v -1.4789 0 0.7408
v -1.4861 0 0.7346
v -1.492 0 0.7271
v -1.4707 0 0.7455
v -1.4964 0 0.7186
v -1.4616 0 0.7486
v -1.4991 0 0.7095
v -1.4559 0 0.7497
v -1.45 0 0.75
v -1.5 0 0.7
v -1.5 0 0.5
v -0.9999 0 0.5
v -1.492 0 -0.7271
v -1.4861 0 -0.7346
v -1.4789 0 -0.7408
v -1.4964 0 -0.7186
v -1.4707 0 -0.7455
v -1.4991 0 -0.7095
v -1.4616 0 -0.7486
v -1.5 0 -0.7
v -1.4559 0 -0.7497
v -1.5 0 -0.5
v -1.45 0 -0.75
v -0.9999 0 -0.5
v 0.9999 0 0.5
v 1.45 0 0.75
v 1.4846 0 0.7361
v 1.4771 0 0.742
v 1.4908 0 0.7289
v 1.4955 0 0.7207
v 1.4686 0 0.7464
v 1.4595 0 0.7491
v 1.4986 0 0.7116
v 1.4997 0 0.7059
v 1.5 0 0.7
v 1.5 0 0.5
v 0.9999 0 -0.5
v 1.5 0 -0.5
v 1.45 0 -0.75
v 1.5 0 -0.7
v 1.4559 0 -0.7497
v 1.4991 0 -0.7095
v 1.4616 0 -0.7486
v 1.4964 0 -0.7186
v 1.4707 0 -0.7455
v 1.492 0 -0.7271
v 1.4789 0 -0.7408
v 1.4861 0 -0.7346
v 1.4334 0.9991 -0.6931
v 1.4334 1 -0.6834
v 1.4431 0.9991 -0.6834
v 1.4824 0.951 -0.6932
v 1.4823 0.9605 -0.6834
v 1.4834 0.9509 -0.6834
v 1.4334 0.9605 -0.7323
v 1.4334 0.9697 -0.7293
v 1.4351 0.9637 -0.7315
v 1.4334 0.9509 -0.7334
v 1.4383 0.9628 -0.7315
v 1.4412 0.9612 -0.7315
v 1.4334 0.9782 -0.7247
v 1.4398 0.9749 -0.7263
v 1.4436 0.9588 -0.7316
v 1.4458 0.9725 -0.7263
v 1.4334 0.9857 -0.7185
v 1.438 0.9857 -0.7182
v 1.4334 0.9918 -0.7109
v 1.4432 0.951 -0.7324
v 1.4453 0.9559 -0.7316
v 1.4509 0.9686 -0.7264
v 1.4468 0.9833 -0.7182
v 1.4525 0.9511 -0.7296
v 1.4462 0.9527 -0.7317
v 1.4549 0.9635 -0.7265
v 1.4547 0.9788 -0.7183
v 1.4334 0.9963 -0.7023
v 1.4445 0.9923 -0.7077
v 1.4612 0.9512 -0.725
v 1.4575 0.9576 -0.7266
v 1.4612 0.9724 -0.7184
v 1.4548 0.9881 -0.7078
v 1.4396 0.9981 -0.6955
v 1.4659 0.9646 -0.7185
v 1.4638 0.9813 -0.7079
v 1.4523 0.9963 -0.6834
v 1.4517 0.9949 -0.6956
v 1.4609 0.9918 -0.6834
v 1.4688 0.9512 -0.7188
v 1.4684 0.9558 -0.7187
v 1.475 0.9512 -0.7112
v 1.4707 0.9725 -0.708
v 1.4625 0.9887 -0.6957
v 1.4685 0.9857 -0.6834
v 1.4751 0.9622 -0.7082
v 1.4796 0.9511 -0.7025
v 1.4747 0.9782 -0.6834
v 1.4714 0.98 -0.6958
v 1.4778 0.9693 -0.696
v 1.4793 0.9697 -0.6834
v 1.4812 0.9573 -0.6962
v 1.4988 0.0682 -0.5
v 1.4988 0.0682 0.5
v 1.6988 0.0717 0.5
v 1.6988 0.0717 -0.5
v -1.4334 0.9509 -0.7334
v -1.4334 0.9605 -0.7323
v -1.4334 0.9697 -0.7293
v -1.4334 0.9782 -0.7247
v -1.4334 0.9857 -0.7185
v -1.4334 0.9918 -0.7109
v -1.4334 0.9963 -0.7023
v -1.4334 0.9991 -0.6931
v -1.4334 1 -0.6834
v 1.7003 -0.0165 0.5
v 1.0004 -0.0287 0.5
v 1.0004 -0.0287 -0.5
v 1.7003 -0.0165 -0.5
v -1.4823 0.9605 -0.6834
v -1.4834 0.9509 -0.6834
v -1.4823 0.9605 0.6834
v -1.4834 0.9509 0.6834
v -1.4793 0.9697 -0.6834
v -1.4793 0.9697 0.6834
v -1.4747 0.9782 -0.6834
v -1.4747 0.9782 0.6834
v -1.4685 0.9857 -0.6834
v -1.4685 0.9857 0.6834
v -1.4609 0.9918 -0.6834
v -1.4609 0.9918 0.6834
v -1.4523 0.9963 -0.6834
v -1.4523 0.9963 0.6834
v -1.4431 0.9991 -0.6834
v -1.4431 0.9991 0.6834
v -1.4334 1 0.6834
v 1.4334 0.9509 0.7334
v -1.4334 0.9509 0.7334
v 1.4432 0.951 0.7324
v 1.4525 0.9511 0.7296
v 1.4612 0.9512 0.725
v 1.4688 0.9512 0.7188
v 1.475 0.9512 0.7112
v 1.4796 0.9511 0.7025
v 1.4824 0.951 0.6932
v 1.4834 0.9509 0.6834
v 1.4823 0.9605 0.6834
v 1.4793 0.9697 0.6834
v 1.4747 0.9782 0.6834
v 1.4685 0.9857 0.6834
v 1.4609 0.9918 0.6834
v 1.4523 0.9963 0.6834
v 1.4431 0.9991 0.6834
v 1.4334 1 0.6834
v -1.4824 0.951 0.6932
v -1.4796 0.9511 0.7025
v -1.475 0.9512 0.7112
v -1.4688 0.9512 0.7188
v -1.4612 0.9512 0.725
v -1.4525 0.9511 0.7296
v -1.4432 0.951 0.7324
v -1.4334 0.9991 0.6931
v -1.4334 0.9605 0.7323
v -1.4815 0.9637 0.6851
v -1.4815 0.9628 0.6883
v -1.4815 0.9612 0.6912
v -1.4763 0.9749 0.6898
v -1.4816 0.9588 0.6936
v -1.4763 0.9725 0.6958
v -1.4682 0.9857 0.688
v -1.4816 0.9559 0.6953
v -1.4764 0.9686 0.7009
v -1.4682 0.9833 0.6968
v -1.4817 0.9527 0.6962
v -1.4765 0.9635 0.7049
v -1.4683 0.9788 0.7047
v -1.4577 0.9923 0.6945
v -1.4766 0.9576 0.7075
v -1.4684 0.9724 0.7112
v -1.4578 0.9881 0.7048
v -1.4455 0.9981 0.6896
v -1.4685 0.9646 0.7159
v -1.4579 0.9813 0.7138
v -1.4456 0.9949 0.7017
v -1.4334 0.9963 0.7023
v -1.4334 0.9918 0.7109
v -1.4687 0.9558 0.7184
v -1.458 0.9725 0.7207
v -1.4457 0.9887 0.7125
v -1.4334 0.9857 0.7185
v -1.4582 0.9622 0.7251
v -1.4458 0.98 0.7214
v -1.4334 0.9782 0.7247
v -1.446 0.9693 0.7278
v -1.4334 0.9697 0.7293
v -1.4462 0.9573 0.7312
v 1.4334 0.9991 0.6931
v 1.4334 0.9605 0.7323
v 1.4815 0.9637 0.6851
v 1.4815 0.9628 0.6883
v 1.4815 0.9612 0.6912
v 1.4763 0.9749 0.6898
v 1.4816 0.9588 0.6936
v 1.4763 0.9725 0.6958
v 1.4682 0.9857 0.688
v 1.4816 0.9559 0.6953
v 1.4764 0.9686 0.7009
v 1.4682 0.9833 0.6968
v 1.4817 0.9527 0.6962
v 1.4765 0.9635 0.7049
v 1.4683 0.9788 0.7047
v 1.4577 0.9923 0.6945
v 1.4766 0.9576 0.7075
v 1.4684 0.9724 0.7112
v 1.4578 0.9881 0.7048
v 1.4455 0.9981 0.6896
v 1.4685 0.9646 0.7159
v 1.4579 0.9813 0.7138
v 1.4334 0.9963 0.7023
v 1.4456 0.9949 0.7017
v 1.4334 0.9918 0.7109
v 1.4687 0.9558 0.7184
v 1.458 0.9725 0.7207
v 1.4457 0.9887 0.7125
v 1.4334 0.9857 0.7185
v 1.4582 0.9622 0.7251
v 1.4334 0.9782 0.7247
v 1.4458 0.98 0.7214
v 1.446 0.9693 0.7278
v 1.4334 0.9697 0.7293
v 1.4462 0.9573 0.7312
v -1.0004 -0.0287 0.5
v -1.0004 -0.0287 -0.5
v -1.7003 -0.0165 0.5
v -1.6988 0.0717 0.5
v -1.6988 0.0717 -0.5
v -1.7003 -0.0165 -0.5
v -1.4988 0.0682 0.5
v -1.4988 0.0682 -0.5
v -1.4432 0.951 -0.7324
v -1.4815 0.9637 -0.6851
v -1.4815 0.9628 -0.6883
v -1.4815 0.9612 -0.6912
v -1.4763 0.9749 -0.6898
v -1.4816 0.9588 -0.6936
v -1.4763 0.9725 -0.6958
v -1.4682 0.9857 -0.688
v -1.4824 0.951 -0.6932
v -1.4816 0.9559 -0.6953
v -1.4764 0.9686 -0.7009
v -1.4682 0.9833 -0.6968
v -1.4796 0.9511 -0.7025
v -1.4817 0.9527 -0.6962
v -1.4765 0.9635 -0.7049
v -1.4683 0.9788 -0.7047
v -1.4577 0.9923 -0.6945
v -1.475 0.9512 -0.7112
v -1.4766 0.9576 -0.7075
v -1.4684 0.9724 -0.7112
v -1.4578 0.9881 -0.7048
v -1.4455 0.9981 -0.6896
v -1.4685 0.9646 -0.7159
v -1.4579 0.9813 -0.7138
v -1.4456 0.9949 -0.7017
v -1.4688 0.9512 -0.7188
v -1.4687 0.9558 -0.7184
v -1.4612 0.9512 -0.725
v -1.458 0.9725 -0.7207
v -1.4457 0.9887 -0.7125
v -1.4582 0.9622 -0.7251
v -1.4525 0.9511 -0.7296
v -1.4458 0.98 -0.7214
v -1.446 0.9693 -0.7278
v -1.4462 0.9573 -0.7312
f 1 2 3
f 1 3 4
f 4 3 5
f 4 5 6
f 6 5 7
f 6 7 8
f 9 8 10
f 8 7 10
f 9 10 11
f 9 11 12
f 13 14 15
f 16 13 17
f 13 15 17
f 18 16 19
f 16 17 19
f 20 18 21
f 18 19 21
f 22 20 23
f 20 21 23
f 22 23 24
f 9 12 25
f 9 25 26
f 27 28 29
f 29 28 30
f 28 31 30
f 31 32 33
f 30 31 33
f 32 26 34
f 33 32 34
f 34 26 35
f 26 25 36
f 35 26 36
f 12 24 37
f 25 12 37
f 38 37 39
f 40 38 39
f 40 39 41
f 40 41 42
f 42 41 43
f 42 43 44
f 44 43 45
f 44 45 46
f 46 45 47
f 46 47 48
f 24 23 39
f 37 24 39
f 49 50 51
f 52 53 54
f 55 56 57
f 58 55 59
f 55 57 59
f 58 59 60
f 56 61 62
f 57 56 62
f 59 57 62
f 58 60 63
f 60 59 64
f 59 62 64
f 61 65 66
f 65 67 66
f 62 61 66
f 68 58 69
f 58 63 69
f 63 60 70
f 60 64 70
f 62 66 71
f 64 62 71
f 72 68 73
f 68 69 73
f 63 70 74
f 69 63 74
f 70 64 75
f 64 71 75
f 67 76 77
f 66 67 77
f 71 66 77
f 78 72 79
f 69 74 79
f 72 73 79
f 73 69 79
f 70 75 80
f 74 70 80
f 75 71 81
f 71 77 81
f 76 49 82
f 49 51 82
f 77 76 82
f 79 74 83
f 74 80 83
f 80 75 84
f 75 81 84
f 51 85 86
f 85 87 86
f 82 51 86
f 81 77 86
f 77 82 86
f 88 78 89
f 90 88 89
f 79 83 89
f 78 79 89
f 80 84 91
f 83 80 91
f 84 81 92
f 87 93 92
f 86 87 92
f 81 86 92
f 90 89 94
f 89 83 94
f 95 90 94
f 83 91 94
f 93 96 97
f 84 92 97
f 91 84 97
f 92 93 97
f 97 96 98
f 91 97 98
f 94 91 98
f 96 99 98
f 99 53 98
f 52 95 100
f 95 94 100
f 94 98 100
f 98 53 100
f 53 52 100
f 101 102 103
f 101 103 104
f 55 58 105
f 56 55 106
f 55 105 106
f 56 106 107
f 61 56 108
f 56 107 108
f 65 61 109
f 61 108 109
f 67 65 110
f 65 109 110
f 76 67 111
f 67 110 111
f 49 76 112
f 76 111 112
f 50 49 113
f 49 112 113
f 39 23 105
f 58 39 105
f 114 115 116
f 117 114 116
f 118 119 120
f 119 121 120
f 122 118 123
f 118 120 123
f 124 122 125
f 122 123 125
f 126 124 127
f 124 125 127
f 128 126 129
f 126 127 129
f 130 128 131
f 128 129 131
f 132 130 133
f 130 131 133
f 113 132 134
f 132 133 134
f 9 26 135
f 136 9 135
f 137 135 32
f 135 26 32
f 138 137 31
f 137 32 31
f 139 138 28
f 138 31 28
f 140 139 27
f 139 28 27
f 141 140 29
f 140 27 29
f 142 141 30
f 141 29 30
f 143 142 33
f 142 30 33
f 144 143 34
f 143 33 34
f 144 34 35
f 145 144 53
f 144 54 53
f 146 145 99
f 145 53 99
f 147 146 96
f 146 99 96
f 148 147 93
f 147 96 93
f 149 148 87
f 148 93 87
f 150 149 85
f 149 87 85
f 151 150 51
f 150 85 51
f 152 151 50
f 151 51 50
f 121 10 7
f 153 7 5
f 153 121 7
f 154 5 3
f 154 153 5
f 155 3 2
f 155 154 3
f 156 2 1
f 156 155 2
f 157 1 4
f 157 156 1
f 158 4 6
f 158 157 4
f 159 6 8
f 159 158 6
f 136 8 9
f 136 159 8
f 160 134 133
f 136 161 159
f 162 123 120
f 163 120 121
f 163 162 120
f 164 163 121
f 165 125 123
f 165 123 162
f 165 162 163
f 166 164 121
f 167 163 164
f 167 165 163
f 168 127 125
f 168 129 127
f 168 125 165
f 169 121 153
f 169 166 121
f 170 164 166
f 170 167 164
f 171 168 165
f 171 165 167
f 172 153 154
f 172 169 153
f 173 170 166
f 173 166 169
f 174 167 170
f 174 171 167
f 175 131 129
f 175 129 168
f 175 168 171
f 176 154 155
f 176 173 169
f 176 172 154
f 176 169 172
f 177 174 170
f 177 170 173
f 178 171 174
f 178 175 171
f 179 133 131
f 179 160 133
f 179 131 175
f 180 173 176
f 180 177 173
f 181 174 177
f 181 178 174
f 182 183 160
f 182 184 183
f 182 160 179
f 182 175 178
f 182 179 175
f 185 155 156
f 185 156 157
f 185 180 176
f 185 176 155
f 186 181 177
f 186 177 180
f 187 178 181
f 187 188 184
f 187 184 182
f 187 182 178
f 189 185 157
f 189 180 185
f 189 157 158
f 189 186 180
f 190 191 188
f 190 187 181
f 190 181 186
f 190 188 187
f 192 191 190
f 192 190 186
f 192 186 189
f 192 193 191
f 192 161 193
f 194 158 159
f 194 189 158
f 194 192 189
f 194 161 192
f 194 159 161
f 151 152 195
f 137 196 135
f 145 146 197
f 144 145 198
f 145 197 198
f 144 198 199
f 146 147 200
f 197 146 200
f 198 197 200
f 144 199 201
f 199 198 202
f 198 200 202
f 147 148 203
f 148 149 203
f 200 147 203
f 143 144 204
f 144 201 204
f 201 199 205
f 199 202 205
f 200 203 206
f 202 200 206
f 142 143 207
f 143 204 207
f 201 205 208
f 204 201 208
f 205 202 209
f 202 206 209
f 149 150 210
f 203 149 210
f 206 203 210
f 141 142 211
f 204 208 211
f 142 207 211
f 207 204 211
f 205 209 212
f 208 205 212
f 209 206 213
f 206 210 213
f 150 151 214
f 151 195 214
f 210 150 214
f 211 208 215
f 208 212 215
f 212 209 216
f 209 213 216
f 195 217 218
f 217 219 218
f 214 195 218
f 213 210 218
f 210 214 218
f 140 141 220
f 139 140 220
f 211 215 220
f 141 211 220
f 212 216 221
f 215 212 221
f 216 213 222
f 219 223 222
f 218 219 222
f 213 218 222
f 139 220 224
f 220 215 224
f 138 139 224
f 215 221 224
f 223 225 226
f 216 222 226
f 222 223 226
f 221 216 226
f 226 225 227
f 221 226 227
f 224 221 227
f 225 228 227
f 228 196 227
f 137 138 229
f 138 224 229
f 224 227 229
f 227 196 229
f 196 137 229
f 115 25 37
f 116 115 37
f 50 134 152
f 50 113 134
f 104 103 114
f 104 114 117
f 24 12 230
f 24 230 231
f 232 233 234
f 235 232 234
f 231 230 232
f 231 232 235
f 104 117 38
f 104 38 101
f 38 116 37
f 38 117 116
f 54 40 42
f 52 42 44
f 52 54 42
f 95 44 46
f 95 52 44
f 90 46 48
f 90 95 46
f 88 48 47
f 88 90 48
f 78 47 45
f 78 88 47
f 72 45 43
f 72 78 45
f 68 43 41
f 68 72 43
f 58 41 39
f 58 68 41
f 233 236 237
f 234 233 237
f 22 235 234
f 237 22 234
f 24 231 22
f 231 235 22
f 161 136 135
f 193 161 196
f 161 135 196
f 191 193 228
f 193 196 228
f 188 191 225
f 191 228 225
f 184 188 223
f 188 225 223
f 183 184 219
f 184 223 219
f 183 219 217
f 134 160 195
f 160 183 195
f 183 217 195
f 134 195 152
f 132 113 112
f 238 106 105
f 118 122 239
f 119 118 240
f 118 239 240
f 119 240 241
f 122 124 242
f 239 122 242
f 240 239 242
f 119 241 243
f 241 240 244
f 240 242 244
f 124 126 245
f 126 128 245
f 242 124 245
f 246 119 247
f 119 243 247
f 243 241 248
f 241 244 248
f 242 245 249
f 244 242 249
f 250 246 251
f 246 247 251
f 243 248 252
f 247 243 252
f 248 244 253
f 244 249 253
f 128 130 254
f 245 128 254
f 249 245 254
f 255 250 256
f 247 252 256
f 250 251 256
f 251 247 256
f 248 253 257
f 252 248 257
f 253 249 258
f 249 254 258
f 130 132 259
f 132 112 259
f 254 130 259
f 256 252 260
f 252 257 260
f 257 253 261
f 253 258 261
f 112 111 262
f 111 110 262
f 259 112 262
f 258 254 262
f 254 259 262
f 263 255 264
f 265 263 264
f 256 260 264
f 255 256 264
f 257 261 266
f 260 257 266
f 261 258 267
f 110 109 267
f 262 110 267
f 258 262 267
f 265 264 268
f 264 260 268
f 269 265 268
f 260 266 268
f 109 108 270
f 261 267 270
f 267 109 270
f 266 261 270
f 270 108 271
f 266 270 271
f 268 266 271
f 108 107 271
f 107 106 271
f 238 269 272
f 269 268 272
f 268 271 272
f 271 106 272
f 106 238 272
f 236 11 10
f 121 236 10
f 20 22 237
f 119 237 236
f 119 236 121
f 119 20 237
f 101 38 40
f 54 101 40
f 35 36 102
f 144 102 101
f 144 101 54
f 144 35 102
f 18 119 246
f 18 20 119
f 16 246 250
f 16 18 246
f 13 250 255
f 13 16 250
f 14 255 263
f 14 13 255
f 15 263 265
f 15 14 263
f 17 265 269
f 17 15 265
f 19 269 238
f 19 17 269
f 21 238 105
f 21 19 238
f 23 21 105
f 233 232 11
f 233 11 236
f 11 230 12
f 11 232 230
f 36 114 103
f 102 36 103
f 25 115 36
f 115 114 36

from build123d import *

# Parameters (mm, degrees)
SKETCH1_W           = 3
SKETCH1_H           = 1.5
BOSS_EXTRUDE1_DEPTH = 1
CHAMFER1_SIZE       = 1
CHAMFER1_SIZE_2     = 0.017455065
FILLET1_R           = 0.05
BOSS_EXTRUDE2_START = -0.5
SKETCH2_W           = 1
SKETCH2_H           = 0.088212482
BOSS_EXTRUDE2_DEPTH = 0.7


with BuildPart() as part:
    # Sketch1 → Boss-Extrude1 (new body)
    with BuildSketch(Plane(origin=(0, 0, 0), x_dir=(1, 0, 0), z_dir=(0, 1, 0))):
        Rectangle(SKETCH1_W, SKETCH1_H)
    extrude(amount=BOSS_EXTRUDE1_DEPTH)

    # Chamfer1
    # the kernel refuses this chamfer: 1, 0.017455065 mm, written as the material it takes off along each edge
    with BuildSketch(Plane(origin=(-1.5, 1, -3.349985355), x_dir=(-0.0006712501823120682, -0.999999774711571, 0), z_dir=(0, 0, 1)), Plane(origin=(1.5, 1, 3.349985355), x_dir=(0.0006712501823120682, -0.999999774711571, 0), z_dir=(0, 0, -1))) as chamfer1_piece_1:
        Polygon((CHAMFER1_SIZE * 0.999999774712, CHAMFER1_SIZE * 0.000671250182312), (-CHAMFER1_SIZE_2 * 0.000671250179552, CHAMFER1_SIZE_2 * 0.999999770599), (0, 0), align=None)
    extrude(amount=6.699970711, mode=Mode.SUBTRACT)
    with BuildSketch(Plane(origin=(4.099985355, 1, -0.75), x_dir=(0, -0.999999774711571, -0.0006712501823119614), z_dir=(-1, 0, 0)), Plane(origin=(-4.099985355, 1, 0.75), x_dir=(0, -0.999999774711571, 0.0006712501823119614), z_dir=(1, 0, 0))) as chamfer1_piece_2:
        Polygon((CHAMFER1_SIZE * 0.999999774712, CHAMFER1_SIZE * 0.000671250182312), (-CHAMFER1_SIZE_2 * 0.000671250179552, CHAMFER1_SIZE_2 * 0.999999770599), (0, 0), align=None)
    extrude(amount=8.199970711, mode=Mode.SUBTRACT)

    # Fillet1
    fillet1_edges = [part.edges().sort_by_distance(p)[0] for p in [
        (0, 1, 0.732544935),
        (1.482544935, 1, 0),
        (0, 1, -0.732544935),
        (-1.482544935, 1, 0),
        (1.491272468, 0.5, -0.741272468),
        (1.491272468, 0.5, 0.741272468),
        (-1.491272468, 0.5, -0.741272468),
        (-1.491272468, 0.5, 0.741272468),
    ]]
    fillet(fillet1_edges, radius=FILLET1_R)

    # Sketch2 → Boss-Extrude2 (add)
    with BuildSketch(Plane(origin=(1.49954312, 0.026174623, 0), x_dir=(0, 0, -1), z_dir=(0.9998476951563914, 0.01745240643728, 0)).offset(BOSS_EXTRUDE2_START)):
        with Locations((0, -0.002072369)):
            Rectangle(SKETCH2_W, SKETCH2_H)
    boss_extrude2 = extrude(amount=BOSS_EXTRUDE2_DEPTH)

    # Mirror1: Boss-Extrude2 across plane
    add(boss_extrude2.mirror(Plane(origin=(0, 0, 0), x_dir=(0, 0, 1), z_dir=(1, 0, 0))))


solid = part.part
